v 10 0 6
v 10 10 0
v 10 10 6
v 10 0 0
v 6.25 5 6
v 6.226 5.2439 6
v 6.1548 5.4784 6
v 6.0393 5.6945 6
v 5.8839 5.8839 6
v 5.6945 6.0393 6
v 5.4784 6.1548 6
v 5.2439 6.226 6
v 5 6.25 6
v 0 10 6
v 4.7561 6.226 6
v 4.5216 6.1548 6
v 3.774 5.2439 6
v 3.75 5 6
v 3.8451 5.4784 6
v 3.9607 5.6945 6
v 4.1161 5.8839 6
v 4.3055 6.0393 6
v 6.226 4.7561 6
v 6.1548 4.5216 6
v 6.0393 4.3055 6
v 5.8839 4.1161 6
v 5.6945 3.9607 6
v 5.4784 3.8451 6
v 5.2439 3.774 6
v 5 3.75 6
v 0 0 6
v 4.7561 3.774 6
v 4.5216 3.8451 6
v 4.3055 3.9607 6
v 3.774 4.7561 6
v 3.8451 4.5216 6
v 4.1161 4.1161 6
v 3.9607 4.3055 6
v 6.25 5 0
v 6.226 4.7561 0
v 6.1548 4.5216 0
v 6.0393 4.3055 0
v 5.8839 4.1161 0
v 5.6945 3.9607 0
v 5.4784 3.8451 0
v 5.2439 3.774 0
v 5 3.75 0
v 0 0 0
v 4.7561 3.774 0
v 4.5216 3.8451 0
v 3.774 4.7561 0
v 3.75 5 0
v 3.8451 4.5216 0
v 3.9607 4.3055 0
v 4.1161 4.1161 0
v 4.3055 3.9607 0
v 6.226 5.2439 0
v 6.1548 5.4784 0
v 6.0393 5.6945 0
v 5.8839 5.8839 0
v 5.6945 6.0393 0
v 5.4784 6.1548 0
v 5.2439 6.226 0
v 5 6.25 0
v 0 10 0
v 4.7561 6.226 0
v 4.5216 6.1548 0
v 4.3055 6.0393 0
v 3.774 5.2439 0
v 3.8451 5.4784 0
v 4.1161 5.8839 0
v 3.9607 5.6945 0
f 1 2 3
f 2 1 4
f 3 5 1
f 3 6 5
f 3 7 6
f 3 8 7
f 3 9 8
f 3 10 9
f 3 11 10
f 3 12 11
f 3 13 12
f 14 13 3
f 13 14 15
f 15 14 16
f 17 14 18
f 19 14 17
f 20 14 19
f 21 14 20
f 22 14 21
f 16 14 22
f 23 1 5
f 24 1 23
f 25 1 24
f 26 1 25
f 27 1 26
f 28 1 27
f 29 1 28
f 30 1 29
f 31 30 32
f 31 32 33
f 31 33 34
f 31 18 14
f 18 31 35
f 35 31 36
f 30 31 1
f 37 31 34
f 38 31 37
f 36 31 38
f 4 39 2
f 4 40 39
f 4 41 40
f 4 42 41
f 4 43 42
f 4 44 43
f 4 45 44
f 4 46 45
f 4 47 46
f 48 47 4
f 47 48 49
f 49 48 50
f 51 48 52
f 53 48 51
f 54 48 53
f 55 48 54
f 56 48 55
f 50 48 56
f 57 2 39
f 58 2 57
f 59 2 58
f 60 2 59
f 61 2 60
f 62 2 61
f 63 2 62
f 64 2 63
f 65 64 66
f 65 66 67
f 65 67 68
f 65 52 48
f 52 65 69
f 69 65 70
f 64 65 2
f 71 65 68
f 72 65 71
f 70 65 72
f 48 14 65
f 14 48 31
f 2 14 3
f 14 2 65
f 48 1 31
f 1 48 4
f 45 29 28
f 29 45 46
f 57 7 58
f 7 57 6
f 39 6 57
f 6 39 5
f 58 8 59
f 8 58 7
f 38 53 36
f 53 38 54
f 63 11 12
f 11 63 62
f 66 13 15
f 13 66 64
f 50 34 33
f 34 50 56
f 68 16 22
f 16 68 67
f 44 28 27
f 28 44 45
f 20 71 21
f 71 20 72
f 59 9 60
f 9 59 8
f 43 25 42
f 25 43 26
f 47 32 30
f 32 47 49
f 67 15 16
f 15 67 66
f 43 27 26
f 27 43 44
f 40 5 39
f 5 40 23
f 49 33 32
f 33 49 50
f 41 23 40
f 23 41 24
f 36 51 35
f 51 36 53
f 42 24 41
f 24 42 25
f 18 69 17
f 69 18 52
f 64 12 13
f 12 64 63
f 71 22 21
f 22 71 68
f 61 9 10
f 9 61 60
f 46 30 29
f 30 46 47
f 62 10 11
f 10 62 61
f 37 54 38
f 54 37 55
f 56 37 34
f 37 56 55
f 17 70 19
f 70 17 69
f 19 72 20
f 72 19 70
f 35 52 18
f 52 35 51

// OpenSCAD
$fn = 32;

// ----------------------------------------------------------------------
// Micro pad: drilled pad, 5-20 mm class
// ----------------------------------------------------------------------

// --- parameters (mm) ---
pad_l = 10;               // pad length, X
pad_w = 10;               // pad width, Y
pad_t = 6;                // pad thickness, Z
hole_d = 2.5;             // through hole diameter

difference() {
  cube([pad_l, pad_w, pad_t]);
  translate([pad_l / 2, pad_w / 2, -1])
    cylinder(h = pad_t + 2, d = hole_d);
}
